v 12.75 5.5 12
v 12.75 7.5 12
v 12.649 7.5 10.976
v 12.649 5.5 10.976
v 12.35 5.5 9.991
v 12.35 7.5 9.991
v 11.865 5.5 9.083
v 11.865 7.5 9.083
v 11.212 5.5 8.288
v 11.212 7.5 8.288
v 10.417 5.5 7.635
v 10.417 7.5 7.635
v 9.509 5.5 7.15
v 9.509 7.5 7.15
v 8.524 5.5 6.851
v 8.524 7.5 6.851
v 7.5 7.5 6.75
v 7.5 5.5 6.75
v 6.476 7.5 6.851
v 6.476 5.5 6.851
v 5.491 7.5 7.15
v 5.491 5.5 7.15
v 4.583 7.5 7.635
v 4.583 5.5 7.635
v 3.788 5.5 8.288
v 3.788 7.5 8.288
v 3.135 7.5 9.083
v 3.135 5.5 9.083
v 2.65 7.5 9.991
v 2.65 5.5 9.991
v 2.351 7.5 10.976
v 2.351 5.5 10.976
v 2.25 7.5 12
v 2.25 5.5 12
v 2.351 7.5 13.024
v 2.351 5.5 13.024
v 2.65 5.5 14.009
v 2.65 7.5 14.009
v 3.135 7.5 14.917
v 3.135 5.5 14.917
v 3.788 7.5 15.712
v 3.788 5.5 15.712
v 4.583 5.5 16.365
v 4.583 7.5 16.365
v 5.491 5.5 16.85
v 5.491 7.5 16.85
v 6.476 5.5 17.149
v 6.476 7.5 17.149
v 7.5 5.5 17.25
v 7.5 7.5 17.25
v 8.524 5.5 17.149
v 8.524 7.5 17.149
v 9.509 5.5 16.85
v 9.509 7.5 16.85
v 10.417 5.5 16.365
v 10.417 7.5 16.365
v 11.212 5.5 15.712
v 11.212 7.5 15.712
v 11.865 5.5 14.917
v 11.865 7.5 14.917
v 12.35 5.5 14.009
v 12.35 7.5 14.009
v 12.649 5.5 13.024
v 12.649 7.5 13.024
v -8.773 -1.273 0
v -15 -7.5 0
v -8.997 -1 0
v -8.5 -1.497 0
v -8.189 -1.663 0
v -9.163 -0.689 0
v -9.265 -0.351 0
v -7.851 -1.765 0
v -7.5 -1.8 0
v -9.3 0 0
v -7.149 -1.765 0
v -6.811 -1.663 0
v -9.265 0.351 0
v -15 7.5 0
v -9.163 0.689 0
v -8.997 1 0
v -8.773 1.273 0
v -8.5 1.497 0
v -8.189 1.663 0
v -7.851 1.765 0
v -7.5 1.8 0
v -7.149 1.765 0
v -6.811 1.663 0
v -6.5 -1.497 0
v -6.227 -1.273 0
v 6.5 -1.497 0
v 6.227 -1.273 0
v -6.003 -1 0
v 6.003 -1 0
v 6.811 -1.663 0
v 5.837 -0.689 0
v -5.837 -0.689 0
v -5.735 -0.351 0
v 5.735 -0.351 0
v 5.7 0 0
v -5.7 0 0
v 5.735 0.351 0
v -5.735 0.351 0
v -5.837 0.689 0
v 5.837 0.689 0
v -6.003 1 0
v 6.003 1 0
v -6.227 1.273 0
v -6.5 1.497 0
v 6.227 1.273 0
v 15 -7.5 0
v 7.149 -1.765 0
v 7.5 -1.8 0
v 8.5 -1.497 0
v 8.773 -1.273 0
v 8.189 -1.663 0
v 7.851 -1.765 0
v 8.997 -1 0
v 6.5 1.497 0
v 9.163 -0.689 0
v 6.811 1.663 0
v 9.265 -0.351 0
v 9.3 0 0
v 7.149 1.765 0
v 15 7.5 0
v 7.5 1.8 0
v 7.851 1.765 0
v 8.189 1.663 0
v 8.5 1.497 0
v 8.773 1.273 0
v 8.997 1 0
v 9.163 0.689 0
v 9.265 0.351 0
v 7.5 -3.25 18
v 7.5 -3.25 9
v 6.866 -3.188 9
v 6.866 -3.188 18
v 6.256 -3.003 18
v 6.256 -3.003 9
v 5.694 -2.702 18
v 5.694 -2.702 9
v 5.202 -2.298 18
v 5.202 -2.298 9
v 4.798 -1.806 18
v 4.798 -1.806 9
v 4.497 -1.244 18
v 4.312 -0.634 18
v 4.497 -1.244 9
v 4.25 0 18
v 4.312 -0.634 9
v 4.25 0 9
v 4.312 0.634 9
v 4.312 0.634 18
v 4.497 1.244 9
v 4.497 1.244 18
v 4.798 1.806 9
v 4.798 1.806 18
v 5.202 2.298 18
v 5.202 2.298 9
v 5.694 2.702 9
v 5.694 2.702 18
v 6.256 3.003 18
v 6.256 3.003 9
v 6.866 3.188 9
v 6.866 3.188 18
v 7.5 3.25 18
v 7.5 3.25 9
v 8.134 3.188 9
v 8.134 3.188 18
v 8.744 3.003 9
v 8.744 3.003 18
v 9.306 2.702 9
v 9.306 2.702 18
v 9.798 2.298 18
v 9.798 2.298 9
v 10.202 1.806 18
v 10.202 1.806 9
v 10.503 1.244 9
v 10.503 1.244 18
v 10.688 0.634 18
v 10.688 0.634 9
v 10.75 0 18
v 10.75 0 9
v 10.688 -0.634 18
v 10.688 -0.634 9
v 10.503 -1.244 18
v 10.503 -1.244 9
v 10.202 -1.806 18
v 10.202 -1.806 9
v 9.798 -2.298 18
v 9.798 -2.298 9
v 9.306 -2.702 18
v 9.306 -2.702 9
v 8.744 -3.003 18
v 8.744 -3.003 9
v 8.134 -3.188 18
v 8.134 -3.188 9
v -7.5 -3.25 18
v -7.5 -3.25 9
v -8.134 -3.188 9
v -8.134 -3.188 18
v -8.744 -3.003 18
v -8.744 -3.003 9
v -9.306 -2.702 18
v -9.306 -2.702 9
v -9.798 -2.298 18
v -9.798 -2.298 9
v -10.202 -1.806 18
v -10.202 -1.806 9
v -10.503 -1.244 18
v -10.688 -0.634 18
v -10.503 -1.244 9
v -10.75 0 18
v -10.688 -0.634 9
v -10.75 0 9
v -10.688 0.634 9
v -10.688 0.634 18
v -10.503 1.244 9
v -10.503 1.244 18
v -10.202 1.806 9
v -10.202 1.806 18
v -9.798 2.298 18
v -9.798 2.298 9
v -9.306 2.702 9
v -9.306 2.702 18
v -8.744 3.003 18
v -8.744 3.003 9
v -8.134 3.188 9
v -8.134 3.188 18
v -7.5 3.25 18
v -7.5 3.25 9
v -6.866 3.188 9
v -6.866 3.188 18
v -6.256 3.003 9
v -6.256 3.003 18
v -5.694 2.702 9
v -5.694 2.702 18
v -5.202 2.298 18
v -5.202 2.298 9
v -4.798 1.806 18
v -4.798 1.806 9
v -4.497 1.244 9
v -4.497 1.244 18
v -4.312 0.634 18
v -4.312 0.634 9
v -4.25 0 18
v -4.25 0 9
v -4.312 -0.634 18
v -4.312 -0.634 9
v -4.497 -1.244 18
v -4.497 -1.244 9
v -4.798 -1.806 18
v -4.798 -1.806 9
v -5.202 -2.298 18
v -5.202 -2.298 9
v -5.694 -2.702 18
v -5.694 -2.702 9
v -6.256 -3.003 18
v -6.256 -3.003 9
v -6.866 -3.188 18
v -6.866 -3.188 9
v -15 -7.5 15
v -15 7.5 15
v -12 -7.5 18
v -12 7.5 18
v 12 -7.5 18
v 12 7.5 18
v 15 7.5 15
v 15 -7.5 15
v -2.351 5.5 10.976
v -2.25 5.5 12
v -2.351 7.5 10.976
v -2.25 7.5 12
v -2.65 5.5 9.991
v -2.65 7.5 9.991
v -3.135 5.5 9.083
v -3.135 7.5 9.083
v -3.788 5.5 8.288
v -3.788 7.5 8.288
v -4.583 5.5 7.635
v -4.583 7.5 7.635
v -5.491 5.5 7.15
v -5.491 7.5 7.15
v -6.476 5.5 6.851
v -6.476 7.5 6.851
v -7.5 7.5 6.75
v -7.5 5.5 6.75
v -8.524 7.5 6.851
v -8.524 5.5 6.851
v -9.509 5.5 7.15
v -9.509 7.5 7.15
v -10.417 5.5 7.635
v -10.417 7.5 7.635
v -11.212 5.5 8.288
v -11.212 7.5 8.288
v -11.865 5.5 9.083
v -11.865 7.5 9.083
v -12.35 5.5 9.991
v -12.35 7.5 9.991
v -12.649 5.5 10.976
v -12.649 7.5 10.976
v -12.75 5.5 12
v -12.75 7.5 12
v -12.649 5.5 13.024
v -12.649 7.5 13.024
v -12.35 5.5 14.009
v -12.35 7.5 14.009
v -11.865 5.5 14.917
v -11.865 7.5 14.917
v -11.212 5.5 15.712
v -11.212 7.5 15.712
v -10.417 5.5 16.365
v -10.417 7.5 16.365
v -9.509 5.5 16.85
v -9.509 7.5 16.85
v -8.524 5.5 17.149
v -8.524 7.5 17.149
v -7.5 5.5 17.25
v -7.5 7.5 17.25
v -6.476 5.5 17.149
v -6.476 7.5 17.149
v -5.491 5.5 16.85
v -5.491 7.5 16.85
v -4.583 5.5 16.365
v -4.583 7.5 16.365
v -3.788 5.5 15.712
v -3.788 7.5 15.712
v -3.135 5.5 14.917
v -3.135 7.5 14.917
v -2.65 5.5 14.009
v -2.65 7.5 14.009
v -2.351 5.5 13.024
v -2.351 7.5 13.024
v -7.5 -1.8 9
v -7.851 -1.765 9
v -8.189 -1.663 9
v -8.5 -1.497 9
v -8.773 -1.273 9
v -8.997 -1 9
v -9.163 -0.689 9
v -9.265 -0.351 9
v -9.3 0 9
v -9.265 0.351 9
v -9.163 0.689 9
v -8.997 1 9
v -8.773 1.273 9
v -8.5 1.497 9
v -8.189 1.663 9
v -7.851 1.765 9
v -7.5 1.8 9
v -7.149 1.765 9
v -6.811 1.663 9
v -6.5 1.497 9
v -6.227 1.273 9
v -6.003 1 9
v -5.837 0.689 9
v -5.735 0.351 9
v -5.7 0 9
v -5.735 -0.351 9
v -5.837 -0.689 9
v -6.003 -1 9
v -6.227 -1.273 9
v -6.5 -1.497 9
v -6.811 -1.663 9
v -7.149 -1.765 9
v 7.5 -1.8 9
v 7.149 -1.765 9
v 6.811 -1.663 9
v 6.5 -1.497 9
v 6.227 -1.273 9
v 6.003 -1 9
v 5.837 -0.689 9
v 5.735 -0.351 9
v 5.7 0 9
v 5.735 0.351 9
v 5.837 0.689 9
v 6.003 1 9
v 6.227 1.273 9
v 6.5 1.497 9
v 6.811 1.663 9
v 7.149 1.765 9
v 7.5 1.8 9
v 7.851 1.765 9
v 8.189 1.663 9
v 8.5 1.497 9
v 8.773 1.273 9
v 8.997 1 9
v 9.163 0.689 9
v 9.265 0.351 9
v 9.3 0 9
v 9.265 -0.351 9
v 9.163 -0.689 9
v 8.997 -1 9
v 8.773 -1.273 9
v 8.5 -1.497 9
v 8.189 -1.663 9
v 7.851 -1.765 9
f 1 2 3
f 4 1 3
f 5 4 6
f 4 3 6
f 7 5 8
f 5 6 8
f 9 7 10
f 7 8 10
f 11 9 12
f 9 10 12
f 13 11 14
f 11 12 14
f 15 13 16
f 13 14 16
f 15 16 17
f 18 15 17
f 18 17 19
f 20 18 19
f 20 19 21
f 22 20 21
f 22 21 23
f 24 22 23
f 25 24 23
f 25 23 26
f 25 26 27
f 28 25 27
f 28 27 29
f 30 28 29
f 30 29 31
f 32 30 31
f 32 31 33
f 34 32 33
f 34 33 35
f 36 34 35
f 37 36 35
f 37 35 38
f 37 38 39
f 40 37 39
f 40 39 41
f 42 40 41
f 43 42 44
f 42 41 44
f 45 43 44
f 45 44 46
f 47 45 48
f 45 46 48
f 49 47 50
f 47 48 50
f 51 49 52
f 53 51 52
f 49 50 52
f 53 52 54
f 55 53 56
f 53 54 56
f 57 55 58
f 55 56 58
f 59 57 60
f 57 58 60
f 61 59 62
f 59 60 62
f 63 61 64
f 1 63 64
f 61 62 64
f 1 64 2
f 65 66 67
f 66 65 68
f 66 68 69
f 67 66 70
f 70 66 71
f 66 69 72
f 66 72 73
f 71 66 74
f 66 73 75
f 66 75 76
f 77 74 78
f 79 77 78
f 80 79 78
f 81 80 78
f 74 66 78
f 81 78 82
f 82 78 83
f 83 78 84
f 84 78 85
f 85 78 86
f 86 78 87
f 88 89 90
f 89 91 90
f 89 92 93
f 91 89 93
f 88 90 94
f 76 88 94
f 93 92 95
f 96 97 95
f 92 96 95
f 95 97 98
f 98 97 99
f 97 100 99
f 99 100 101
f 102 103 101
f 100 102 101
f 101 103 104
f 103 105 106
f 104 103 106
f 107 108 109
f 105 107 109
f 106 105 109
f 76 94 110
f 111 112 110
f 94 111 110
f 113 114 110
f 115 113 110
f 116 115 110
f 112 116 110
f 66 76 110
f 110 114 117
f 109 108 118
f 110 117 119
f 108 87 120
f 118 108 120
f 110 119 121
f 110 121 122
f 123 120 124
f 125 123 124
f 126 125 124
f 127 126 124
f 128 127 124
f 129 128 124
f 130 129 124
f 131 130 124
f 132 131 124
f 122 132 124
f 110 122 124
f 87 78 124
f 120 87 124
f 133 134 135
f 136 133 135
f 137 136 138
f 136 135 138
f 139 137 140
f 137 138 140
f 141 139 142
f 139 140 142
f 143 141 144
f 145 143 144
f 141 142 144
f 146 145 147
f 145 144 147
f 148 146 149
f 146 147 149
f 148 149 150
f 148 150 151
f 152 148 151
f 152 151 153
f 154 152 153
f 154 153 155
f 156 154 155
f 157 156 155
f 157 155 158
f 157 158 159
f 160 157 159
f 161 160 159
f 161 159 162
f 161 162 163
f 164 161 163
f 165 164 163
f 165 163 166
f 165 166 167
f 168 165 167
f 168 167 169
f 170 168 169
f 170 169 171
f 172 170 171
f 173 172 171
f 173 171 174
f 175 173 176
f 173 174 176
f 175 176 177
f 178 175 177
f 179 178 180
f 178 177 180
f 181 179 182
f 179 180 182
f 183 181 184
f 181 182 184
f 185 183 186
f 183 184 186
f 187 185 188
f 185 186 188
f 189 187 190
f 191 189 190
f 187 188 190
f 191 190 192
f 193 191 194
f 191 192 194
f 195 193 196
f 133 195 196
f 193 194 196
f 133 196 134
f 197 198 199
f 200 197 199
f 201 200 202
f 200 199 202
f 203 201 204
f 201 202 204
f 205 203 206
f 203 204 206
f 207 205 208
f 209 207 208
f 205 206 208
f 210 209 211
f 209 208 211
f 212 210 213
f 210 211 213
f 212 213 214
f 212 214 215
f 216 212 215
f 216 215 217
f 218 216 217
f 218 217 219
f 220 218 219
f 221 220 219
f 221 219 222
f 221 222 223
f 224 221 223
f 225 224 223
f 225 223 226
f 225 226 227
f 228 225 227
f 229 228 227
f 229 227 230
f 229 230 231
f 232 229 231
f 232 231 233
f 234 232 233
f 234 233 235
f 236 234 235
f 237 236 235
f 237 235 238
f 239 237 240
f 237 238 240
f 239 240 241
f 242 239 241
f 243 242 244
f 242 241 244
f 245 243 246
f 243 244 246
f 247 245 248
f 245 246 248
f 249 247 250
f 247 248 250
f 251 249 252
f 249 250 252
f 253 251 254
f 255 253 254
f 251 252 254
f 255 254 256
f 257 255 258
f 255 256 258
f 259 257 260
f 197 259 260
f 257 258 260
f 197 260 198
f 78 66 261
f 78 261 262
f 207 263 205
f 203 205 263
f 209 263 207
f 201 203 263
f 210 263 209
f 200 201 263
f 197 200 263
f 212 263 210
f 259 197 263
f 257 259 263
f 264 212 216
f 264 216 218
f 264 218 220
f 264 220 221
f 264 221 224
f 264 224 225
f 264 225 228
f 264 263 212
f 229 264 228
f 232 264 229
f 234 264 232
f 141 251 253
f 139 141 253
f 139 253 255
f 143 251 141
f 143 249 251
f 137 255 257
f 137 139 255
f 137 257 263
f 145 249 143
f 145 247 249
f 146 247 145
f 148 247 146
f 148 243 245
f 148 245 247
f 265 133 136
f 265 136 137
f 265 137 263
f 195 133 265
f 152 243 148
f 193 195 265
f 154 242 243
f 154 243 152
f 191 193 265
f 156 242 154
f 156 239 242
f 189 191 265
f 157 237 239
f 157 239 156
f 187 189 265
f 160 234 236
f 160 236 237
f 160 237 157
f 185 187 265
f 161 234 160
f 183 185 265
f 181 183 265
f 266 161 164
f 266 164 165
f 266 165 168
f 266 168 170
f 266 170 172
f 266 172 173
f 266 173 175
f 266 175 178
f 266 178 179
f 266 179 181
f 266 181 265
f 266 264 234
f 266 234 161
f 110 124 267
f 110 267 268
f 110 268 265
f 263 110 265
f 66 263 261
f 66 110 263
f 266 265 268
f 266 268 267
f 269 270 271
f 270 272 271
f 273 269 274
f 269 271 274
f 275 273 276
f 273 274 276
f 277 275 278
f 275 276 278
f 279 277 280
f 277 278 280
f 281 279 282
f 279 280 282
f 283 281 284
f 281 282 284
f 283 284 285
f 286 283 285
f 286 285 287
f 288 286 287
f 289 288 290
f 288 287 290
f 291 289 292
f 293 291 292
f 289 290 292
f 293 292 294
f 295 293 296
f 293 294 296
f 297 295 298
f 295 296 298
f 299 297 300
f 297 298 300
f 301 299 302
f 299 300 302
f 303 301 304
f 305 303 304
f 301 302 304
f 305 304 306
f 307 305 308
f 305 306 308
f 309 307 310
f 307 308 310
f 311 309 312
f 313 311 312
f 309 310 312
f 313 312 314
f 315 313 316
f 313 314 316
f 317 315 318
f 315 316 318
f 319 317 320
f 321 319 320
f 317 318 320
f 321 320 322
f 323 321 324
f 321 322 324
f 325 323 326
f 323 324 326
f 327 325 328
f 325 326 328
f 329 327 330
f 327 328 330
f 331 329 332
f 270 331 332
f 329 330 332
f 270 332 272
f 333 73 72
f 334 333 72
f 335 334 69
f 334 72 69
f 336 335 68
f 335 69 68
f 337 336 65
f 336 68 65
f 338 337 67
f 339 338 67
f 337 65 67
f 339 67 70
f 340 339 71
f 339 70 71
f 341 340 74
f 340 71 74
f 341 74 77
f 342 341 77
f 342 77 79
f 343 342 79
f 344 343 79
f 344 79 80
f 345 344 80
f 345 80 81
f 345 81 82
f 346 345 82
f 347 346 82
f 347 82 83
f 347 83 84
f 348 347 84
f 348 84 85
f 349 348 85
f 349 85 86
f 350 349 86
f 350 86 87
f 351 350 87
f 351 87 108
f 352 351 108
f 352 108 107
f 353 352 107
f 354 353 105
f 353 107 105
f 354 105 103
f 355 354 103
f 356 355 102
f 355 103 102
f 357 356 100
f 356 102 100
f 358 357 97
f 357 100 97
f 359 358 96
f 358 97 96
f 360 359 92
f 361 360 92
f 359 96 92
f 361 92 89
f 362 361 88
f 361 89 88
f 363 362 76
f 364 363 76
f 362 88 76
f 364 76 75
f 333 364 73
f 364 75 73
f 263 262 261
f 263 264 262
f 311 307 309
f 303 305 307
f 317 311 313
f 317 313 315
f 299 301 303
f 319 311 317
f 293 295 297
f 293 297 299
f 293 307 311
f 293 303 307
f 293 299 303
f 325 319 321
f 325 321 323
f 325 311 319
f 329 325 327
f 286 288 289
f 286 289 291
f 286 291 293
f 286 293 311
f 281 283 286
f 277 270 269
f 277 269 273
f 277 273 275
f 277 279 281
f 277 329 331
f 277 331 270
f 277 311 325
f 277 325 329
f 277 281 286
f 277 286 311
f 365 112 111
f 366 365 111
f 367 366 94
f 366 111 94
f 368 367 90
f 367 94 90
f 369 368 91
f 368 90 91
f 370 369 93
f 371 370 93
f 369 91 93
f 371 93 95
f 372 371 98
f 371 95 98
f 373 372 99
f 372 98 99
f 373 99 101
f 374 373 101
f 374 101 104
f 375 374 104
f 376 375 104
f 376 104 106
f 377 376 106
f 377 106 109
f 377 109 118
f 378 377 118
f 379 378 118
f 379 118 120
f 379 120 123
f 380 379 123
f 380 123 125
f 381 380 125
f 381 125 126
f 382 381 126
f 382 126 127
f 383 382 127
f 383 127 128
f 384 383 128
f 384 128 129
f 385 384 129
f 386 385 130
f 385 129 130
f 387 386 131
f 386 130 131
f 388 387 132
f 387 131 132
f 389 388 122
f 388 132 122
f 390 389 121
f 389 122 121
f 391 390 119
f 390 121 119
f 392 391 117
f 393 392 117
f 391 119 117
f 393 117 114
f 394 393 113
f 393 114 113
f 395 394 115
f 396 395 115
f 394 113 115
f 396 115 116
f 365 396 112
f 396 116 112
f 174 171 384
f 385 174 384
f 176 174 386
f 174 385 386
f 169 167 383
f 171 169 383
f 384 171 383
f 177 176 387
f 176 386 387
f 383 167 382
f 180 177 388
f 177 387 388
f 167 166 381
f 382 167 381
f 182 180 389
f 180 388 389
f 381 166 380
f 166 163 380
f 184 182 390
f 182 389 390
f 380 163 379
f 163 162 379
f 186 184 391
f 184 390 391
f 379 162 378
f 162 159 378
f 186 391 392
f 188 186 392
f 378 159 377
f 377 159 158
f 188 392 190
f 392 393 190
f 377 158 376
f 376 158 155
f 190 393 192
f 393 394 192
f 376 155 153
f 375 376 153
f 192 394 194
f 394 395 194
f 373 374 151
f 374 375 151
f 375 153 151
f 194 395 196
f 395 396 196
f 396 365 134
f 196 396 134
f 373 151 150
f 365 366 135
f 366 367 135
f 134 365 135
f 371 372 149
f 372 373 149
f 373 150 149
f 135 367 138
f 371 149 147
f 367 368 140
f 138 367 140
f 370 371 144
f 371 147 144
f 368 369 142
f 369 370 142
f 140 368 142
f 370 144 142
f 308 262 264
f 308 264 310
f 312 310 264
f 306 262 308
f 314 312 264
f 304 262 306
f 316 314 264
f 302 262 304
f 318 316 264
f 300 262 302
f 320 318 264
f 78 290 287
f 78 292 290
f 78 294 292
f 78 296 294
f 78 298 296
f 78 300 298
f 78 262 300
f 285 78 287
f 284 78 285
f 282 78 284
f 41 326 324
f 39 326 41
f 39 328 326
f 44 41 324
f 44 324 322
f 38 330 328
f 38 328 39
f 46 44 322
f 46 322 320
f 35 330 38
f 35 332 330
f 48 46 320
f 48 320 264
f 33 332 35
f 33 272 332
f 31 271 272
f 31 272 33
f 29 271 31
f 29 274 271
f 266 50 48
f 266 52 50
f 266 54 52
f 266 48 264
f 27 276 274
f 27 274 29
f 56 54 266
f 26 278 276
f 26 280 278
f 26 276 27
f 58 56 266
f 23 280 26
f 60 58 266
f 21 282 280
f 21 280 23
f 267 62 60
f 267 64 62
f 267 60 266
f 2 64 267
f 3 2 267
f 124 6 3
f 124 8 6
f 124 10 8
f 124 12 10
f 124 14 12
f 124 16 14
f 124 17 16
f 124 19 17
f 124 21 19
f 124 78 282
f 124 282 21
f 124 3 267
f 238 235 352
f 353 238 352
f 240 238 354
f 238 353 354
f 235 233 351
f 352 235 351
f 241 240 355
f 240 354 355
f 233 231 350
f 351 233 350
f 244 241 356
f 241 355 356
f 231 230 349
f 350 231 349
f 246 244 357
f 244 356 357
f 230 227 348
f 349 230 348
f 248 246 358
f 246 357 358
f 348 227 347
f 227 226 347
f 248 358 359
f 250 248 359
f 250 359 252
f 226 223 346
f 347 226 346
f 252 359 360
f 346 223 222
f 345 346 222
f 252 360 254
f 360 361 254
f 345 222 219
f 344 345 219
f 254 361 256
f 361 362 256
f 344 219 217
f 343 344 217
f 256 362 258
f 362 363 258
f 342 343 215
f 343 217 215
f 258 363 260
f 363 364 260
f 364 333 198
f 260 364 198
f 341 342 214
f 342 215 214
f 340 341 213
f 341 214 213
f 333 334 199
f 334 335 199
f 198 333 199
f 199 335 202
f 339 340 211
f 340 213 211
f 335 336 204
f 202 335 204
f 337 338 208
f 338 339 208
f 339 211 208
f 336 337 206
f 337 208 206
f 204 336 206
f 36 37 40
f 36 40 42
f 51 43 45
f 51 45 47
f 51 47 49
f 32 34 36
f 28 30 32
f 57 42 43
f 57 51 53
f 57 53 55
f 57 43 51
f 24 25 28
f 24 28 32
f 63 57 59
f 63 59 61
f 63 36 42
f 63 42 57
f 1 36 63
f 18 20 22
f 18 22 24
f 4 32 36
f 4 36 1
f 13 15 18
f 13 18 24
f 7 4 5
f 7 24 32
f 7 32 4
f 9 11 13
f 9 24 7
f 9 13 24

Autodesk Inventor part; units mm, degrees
ref_plane "YZ Plane" through (0, 0, 0) normal (1, 0, 0) x (0, 1, 0)
ref_plane "XZ Plane" through (0, 0, 0) normal (0, 1, 0) x (-1, 0, 0)
ref_plane "XY Plane" through (0, 0, 0) normal (0, 0, 1) x (1, 0, 0)
sketch "Sketch1" plane through (0, 0, 0) normal (0, 0, 1) x (1, 0, 0)
  line L0 (15, -7.5) -> (-15, -7.5)
  line L1 (-15, -7.5) -> (-15, 7.5)
  line L2 (-15, 7.5) -> (15, 7.5)
  line L3 (15, 7.5) -> (15, -7.5)
  line L4 (15, -7.5) -> (-15, 7.5) construction
  line L5 (-15, -7.5) -> (15, 7.5) construction
  point P0 (0, 0)
  dimension "d0" = 15
  dimension "d1" = 30
extrude "Extrusion1" add sketch "Sketch1" along normal blind 18
sketch "Sketch2" plane through (-15, 7.5, 0) normal (0, 1, 0) x (1, 0, 0)
  line L0 (30, 0) -> (0, 0) projected
  line L1 (0, 0) -> (0, -18) projected
  line L2 (30, -18) -> (0, -18) projected
  line L3 (30, 0) -> (30, -18) projected
  circle A0 centre (7.5, -12) radius 5.25
  circle A1 centre (22.5, -12) radius 5.25
  line L4 (30, 0) -> (0, 0) projected
  point P0 (15, 0)
  point P1 (15, 0)
  point P2 (15, 0)
  dimension "d4" = 10.5
  dimension "d5" = 6
  dimension "d6" = 7.5
  dimension "d7" = 7.5
extrude "Extrusion2" cut sketch "Sketch2" against normal blind 2 contours A0 | A1
chamfer "Chamfer1" distance 3 angle 45 2 edges at (15, 0, 18) (-15, 0, 18)
sketch "Sketch3" plane through (0, 0, 18) normal (0, 0, 1) x (1, 0, 0)
  line L0 (-12, -7.5) -> (-12, 7.5) projected
  line L1 (-12, -7.5) -> (12, -7.5) projected
  line L2 (12, 7.5) -> (12, -7.5) projected
  line L3 (12, 7.5) -> (-12, 7.5) projected
  point P0 (0, 0)
  point P1 (-7.5, 0)
  point P2 (7.5, 0)
  dimension "d13" = 7.5
  dimension "d14" = 7.5
hole "Hole1" at (-7.5, 0, 18) at (7.5, 0, 18) direction (0, 0, -1) diameter 3.6 end through all counterbore diameter 6.5 counterbore depth 9 clearance for "Socket Head Cap Screw ISO 4762" size "M3" standard "ISO"
equation "\"d7\" = d6"
equation "\"d14\" = d13"
properties part number "Door Base Magnet" material "ABS Plastic"
